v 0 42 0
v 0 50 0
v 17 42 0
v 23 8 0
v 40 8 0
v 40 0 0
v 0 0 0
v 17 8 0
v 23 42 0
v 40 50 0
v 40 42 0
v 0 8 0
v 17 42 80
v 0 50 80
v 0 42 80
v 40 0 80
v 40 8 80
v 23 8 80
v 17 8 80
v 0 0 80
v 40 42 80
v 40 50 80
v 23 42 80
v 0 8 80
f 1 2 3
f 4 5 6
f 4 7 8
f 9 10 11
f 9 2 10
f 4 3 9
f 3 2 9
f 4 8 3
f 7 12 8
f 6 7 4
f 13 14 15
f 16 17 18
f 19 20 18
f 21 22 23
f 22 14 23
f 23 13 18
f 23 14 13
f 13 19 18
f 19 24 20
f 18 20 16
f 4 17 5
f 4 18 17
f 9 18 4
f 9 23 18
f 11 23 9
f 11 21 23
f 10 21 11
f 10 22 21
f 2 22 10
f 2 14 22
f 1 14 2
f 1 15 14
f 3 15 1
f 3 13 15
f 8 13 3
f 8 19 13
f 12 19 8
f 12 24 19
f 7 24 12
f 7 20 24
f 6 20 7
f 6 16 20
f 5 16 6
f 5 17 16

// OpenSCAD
$fn = 32;

// ----------------------------------------------------------------------
// Structural section: ibeam 40 x 50 mm
// ----------------------------------------------------------------------

// --- parameters (mm) ---
sec_w = 40;               // section width, X
sec_h = 50;               // section height, Y
flange_t = 8;             // flange thickness
web_t = 6;                // web thickness
plate_t = 80;             // cut length, Z (extrusion height)

profile = [[0, 0], [40, 0], [40, 8], [23, 8], [23, 42], [40, 42], [40, 50], [0, 50], [0, 42], [17, 42], [17, 8], [0, 8]];  // primary outline, 12 points, counter clockwise

// --- the one profile operation ---
linear_extrude(height = plate_t) polygon(points = profile);
